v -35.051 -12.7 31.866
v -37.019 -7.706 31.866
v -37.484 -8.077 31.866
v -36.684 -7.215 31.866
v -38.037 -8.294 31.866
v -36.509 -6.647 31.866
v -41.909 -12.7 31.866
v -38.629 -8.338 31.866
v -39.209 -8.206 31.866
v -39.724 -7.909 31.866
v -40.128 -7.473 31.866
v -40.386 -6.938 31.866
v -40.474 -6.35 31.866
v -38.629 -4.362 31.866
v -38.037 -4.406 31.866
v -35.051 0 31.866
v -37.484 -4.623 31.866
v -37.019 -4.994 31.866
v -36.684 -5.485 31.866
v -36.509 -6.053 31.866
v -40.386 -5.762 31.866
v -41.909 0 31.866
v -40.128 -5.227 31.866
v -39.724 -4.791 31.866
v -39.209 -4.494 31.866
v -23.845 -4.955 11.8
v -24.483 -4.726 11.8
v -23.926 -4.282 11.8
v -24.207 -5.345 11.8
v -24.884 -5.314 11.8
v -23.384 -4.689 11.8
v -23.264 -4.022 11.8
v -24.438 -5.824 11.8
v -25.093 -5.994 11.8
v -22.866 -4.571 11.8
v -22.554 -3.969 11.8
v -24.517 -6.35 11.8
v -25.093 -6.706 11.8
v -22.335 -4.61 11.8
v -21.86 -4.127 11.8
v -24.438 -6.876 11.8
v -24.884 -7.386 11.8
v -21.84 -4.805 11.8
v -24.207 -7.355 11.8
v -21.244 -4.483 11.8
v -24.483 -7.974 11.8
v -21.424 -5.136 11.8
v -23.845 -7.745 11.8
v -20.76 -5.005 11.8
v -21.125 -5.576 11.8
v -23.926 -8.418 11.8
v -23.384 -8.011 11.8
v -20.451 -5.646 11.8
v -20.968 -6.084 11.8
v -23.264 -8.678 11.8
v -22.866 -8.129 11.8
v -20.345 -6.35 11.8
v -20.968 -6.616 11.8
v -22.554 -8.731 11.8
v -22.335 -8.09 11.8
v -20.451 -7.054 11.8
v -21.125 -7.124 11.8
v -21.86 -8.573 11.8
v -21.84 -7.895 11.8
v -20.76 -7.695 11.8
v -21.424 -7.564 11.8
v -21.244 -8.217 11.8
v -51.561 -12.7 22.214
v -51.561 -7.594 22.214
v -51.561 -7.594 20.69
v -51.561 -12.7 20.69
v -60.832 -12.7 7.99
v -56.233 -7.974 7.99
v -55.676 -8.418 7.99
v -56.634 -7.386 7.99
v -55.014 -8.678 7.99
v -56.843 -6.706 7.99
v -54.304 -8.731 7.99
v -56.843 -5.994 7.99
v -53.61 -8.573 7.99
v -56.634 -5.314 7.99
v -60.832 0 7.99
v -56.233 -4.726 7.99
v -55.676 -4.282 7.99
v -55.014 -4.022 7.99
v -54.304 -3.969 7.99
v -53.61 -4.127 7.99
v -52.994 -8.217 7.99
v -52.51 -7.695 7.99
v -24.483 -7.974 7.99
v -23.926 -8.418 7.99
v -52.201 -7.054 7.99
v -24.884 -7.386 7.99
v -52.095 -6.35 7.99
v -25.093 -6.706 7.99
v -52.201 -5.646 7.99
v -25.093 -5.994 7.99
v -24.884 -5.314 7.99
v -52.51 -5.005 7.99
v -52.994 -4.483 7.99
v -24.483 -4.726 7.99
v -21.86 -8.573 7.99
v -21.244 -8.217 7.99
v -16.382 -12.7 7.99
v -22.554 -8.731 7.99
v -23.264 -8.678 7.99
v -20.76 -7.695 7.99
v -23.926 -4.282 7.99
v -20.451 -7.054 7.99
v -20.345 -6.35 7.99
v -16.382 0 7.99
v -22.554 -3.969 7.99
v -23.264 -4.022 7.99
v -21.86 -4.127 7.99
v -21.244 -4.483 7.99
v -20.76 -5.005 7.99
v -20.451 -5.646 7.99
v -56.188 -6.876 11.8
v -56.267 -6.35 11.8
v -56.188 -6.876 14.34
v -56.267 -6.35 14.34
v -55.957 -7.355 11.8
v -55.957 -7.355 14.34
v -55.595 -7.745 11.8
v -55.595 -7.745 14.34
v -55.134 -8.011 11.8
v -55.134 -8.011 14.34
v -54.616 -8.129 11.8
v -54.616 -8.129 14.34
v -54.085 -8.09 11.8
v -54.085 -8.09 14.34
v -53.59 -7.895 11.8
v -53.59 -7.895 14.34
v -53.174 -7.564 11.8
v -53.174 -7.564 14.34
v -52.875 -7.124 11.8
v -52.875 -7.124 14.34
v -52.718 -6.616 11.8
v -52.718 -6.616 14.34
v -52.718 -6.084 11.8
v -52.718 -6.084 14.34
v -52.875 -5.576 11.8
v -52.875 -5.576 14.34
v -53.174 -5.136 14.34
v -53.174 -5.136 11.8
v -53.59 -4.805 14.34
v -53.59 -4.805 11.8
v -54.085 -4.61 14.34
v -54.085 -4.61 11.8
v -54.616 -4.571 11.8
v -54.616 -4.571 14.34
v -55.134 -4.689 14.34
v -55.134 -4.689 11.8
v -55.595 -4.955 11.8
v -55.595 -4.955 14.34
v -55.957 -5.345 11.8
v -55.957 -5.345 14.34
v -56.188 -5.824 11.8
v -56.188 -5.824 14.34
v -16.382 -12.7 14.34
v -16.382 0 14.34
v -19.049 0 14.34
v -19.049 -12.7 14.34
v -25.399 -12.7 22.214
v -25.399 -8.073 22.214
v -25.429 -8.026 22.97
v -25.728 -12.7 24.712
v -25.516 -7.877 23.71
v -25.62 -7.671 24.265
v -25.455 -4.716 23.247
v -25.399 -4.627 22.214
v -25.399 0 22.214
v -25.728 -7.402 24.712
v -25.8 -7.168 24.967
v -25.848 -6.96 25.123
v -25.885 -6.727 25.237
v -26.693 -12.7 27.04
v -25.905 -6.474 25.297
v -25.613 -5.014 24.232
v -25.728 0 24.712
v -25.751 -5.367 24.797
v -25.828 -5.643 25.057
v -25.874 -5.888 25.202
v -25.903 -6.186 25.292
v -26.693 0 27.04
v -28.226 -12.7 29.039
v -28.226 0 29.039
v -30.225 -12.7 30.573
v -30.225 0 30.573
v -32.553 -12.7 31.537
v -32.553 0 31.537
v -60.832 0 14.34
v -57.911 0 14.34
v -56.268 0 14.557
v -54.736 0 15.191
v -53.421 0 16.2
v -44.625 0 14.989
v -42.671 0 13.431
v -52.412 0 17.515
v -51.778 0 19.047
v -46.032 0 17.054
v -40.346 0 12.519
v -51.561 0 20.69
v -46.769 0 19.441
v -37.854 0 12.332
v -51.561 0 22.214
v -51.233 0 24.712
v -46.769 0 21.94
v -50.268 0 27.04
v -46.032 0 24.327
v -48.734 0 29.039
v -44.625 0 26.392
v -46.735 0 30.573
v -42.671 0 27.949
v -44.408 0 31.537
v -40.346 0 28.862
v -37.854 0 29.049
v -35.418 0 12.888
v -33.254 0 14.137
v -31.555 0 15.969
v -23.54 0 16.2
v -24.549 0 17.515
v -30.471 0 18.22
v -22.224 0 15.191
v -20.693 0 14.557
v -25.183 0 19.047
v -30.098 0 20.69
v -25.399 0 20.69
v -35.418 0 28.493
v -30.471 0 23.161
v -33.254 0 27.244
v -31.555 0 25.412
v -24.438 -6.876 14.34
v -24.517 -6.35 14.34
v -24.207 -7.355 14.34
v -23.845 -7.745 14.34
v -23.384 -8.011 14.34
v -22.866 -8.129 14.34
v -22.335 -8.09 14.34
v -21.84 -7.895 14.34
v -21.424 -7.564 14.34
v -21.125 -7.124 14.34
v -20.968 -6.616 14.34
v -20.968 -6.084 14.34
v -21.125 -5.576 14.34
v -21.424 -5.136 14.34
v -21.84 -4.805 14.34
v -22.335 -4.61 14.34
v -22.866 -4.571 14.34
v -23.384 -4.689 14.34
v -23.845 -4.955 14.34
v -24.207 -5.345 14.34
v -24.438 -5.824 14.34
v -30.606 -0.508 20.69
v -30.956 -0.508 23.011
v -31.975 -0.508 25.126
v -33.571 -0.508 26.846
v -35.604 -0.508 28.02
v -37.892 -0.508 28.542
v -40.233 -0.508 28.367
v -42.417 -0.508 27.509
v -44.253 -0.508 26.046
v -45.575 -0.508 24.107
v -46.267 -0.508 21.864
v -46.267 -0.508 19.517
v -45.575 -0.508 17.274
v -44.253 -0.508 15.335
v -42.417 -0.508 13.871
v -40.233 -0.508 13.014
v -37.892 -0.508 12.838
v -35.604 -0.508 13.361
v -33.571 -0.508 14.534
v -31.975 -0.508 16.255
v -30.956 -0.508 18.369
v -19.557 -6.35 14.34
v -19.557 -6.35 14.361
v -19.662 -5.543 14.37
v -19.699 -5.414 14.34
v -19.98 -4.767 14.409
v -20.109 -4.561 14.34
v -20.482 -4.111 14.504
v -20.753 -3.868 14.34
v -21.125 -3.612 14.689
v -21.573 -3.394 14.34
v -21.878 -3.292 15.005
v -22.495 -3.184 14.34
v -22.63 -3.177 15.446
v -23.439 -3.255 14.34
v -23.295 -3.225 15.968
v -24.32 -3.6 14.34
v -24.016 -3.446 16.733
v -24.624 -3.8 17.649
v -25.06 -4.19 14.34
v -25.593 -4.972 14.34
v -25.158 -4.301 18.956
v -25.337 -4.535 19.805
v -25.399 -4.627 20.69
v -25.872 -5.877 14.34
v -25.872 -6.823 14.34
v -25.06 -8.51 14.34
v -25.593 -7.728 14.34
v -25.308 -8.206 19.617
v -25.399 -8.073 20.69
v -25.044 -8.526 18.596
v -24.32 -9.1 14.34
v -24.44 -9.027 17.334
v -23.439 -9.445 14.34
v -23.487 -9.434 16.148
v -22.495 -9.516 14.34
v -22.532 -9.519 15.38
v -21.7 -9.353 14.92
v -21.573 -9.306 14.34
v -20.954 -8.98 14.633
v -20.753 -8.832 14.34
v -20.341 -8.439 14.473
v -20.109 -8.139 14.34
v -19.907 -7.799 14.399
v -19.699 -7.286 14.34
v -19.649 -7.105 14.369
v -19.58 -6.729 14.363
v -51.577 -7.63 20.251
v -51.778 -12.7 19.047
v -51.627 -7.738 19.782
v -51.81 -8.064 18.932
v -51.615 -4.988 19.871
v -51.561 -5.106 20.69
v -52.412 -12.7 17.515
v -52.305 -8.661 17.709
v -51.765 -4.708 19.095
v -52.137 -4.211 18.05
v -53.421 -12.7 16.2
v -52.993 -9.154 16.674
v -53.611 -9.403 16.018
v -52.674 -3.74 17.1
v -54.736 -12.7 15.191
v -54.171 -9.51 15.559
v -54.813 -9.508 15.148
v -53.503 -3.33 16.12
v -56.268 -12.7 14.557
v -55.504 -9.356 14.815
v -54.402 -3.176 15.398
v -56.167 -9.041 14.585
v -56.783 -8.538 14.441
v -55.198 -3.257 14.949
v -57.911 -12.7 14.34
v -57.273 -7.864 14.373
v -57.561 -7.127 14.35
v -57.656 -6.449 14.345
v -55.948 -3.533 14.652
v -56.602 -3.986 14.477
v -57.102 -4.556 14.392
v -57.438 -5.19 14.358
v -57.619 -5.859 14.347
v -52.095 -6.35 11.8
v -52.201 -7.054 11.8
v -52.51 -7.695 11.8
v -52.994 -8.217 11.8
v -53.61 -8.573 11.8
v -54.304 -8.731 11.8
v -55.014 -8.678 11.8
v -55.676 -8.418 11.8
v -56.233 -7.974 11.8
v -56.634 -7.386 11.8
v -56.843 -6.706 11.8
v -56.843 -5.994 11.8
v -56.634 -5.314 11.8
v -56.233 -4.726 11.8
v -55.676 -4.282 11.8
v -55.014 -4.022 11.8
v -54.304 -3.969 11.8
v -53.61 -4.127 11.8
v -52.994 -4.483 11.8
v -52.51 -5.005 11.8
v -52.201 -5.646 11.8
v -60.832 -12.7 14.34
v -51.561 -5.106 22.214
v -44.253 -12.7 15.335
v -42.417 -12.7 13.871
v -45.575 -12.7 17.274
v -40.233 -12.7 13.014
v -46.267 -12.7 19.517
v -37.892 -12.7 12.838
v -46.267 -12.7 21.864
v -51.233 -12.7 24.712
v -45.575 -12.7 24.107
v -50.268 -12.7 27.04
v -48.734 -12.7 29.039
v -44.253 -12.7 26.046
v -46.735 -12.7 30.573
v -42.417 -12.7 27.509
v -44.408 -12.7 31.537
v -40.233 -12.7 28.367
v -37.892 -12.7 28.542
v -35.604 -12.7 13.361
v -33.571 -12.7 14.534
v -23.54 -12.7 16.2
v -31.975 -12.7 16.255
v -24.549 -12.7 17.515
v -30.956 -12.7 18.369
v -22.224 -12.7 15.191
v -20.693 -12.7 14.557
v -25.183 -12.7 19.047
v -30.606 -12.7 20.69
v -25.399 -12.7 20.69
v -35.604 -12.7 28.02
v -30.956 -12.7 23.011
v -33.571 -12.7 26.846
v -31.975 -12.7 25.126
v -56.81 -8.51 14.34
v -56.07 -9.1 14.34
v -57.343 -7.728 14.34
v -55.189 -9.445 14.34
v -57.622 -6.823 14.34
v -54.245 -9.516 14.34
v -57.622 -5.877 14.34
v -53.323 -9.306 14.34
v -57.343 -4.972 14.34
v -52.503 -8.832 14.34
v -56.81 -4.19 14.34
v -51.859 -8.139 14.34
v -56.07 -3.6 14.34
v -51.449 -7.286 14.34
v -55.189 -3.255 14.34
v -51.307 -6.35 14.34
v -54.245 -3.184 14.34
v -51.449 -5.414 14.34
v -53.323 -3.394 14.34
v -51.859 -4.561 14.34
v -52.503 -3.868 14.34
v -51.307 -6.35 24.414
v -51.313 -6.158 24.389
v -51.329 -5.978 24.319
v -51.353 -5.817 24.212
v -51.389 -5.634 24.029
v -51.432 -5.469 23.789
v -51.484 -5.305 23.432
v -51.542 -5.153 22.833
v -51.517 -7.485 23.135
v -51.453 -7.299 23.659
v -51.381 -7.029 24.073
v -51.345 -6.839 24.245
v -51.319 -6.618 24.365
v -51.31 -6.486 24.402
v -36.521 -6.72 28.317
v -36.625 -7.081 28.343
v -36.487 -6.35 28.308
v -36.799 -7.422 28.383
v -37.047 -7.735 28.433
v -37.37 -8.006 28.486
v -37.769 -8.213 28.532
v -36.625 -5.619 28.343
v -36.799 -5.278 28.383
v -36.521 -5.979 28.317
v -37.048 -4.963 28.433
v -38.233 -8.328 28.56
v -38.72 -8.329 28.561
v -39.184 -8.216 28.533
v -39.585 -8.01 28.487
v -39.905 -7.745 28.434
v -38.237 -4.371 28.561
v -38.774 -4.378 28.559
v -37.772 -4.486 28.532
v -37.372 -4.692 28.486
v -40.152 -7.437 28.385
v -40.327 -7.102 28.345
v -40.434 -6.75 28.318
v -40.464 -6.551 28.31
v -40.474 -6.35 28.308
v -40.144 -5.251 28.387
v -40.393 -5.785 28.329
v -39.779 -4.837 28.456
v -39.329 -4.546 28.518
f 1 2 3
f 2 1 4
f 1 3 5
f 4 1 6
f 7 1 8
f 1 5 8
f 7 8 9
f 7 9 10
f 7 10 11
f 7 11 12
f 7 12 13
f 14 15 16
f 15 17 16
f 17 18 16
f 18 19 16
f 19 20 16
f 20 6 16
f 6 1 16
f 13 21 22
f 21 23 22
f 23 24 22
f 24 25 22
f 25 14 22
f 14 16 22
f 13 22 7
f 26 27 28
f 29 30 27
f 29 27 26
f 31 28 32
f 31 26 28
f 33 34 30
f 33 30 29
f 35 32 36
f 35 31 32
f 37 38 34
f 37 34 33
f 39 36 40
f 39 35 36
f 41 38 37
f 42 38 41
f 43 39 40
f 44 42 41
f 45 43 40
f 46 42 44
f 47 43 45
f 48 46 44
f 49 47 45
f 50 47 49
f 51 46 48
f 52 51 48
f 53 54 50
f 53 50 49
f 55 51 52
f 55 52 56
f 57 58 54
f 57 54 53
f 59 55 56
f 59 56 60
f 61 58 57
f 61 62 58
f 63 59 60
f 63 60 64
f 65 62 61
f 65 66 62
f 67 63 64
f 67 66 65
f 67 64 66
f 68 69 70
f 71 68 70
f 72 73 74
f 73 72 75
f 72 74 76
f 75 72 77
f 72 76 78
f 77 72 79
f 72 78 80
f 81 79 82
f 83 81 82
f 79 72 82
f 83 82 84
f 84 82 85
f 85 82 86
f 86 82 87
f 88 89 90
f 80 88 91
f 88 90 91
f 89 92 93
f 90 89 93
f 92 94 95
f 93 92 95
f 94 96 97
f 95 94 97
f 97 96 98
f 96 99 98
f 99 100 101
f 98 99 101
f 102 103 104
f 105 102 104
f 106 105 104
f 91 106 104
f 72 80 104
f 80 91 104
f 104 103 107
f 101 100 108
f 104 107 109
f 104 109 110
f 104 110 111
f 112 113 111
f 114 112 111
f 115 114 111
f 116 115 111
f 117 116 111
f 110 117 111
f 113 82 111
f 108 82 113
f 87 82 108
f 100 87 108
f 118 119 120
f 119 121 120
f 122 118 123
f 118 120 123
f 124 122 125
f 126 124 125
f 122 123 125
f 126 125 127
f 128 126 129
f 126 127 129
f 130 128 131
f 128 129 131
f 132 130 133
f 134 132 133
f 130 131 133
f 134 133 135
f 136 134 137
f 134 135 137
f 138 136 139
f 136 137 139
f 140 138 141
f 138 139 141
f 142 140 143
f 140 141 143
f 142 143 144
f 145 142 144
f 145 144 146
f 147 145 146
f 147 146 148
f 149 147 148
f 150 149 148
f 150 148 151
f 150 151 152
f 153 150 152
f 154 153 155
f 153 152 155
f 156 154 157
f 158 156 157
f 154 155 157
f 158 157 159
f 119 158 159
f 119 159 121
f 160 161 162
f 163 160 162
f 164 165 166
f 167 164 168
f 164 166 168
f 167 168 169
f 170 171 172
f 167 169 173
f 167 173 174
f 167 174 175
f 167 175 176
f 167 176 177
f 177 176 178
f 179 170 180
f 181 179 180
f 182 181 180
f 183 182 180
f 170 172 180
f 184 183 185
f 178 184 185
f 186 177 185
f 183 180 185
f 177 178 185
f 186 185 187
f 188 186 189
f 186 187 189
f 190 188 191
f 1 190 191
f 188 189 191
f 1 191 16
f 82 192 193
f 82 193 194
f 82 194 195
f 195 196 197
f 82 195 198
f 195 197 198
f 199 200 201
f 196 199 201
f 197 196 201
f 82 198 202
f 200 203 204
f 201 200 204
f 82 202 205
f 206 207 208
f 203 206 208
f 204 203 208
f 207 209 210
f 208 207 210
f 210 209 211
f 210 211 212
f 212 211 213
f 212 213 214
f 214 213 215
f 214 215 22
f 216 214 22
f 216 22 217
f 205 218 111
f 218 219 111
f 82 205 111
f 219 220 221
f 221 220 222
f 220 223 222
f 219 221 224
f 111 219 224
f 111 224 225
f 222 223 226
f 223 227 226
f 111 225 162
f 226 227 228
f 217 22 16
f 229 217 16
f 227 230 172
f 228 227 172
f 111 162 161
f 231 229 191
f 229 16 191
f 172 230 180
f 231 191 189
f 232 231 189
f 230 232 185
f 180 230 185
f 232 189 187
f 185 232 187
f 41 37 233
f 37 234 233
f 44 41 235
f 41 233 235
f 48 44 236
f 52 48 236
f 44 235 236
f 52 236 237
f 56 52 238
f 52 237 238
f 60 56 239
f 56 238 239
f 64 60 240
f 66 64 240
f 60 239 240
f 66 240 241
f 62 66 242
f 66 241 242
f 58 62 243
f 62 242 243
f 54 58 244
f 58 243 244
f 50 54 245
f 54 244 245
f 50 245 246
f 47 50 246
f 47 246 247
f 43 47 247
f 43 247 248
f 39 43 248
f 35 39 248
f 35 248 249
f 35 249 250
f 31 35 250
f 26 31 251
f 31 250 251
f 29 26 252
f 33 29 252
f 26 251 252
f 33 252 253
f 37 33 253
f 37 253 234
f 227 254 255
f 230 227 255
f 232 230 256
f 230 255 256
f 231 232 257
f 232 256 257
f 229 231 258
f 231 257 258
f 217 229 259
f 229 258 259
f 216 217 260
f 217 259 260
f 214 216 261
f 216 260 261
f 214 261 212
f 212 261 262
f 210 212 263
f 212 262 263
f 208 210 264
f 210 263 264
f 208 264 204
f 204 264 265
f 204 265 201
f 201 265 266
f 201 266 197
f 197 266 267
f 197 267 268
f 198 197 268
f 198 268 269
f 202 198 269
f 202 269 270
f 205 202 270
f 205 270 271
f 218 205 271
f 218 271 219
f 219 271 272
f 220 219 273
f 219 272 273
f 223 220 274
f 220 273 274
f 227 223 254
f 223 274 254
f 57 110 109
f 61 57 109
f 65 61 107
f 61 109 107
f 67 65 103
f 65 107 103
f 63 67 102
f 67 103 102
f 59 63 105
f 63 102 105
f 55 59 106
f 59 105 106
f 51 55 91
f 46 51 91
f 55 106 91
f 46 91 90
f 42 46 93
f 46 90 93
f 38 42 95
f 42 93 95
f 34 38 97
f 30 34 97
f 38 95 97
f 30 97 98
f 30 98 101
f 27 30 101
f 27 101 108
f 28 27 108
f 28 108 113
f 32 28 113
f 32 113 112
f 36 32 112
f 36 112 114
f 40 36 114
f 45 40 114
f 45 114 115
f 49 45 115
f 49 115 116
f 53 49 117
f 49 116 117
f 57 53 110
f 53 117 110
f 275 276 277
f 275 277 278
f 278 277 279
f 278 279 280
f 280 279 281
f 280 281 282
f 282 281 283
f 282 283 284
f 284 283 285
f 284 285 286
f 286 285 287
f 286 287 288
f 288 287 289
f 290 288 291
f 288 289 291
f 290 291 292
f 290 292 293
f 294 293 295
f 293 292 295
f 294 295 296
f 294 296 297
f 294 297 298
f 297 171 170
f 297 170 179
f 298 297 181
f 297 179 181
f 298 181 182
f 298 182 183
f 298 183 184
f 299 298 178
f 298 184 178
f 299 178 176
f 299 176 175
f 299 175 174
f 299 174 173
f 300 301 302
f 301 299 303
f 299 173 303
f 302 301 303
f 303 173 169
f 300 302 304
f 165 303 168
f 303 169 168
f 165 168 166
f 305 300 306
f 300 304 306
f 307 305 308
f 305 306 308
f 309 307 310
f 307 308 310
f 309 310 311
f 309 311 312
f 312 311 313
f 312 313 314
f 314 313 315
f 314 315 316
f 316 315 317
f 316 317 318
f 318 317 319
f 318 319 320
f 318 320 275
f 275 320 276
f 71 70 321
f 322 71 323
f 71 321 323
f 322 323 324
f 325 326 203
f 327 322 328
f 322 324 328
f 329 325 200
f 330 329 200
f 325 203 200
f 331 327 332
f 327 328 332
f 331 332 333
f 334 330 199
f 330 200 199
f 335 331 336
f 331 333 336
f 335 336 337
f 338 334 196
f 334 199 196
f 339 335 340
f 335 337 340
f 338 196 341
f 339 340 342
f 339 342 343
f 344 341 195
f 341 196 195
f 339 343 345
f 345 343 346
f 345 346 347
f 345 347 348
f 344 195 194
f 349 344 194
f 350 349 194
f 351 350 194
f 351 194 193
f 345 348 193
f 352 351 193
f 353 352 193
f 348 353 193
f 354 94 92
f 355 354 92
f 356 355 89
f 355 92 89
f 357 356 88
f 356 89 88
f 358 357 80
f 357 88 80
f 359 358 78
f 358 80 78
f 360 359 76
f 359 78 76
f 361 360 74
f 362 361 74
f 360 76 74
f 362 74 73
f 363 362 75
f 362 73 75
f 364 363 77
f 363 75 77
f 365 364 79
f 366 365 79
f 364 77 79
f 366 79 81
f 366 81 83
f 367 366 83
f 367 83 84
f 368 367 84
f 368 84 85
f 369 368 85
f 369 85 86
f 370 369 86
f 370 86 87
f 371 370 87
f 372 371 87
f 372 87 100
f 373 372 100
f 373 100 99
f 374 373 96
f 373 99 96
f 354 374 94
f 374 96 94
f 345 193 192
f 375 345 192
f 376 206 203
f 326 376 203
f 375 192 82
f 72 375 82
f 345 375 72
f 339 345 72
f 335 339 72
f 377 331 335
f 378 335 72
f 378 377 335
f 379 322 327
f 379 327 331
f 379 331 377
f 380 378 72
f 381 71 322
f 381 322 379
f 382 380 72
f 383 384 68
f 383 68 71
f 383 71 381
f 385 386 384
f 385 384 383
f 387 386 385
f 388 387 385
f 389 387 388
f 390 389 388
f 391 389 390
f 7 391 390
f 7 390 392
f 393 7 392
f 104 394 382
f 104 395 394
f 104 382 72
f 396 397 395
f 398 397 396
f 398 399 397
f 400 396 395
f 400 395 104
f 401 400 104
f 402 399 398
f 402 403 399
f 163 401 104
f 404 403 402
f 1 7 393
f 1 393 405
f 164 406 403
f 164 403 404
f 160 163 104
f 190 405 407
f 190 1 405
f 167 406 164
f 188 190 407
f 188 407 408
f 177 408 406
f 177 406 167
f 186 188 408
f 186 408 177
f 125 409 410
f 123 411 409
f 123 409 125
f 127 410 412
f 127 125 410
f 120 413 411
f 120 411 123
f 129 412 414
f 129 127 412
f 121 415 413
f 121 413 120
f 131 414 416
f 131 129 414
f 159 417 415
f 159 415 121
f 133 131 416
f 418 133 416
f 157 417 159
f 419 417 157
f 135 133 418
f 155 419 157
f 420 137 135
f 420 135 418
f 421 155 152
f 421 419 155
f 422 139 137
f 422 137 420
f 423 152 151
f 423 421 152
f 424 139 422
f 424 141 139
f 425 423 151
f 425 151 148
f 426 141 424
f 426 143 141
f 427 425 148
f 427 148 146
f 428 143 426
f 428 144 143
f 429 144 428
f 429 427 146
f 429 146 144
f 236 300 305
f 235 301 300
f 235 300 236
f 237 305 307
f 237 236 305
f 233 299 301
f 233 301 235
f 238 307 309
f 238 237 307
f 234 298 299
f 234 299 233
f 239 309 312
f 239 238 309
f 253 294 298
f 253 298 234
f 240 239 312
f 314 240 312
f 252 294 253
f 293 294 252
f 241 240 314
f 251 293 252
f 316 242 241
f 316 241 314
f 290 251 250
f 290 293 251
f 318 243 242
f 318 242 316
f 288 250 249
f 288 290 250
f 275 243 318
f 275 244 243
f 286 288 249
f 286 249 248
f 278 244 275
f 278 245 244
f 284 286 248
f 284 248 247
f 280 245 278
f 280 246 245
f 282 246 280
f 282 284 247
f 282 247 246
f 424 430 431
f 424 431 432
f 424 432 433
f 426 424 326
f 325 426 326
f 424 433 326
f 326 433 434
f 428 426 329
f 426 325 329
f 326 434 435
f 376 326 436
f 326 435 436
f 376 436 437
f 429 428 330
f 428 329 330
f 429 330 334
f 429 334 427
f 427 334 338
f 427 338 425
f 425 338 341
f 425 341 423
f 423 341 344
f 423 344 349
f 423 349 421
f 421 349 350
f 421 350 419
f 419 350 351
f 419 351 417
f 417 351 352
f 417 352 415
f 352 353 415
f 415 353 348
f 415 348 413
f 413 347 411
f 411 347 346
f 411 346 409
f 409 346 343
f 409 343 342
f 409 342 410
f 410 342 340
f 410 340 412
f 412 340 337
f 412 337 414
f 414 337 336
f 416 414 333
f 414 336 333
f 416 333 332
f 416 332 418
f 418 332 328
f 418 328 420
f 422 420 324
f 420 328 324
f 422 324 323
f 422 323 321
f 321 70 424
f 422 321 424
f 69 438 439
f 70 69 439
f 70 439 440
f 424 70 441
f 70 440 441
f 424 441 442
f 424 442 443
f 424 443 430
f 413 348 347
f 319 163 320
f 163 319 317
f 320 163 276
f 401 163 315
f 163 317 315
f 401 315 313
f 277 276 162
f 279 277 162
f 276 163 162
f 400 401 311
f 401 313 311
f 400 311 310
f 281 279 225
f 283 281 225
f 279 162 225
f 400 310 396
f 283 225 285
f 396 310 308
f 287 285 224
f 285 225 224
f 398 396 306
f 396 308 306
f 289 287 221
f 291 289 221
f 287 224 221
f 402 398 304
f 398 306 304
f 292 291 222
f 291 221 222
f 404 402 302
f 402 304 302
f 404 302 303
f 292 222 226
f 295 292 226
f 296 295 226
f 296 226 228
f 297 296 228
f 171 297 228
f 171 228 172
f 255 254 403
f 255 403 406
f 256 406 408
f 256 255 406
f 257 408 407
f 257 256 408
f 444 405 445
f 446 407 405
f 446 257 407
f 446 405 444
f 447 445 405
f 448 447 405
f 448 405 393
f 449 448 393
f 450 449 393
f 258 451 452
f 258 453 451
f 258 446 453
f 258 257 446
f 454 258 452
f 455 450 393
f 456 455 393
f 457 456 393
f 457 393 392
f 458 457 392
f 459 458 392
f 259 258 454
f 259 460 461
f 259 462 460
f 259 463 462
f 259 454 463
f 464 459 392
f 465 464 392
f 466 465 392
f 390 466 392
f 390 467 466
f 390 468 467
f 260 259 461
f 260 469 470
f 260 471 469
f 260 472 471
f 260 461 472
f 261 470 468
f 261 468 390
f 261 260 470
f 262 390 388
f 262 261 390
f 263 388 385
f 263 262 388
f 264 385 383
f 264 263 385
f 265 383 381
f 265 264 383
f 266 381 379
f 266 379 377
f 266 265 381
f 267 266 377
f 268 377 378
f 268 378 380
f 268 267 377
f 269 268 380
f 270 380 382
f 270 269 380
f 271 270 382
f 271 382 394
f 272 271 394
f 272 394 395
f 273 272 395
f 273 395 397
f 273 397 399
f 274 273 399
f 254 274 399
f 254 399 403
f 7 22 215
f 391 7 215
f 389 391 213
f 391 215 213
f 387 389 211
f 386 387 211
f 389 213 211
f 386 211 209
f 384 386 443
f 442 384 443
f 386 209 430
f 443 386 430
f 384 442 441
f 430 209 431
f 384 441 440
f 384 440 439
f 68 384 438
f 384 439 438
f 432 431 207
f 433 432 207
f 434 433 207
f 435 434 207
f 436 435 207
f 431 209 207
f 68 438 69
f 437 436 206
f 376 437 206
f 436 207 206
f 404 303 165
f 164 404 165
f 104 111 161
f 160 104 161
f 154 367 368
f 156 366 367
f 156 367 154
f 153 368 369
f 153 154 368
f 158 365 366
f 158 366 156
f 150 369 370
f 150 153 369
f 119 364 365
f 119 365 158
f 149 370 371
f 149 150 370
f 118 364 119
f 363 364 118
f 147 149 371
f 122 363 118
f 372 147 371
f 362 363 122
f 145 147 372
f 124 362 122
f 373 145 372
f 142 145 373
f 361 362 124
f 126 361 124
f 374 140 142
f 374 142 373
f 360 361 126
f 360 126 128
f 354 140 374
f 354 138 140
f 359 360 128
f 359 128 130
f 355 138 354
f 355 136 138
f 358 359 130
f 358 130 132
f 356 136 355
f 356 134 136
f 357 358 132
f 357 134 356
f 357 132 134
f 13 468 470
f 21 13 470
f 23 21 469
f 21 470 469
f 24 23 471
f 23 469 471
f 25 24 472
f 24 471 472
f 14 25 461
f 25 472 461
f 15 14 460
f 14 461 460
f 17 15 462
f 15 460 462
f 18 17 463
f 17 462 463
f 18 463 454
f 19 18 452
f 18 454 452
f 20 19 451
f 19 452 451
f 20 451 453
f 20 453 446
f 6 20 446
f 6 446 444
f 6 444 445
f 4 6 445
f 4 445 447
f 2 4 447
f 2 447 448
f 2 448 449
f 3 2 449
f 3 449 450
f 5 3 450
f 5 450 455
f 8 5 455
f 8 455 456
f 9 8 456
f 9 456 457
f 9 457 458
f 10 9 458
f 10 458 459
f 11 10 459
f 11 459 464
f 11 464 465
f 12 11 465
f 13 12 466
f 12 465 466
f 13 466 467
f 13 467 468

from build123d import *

# Parameters (mm, degrees)
F0_R      = 7.874
F1_DEPTH  = 12.7
F3_D      = 3.5687
F2_R      = 2.3876
F4_DEPTH  = 3.81
F6_R      = 3.175
F7_DEPTH  = 12.7
F9_D      = 3.9878
F9_DEPTH  = 6.35
F9_TIP    = 1.1980559883
F10_SIZE2 = 0.508
F10_SIZE  = 0.508


with BuildPart() as f1:
    # F0 (on Front) → F1 (new body)
    with BuildSketch(Plane.XZ):
        with BuildLine():
            Line((-60.8324925442, 14.3403462902), (-60.8324925442, 7.9903462902))
            Line((-60.8324925442, 7.9903462902), (-16.3824925442, 7.9903462902))
            Line((-16.3824925442, 7.9903462902), (-16.3824925442, 14.3403462902))
            Line((-16.3824925442, 14.3403462902), (-19.0494925442, 14.3403462902))
            ThreePointArc((-19.0494925442, 14.3403462902), (-23.5396206047, 16.2002182296), (-25.3994925442, 20.6903462902))
            Line((-25.3994925442, 20.6903462902), (-25.3994925442, 22.2143462902))
            ThreePointArc((-25.3994925442, 22.2143462902), (-28.2264978922, 29.0393409422), (-35.0514925442, 31.8663462902))
            Line((-35.0514925442, 31.8663462902), (-41.9094925442, 31.8663462902))
            ThreePointArc((-41.9094925442, 31.8663462902), (-48.7344871962, 29.0393409422), (-51.5614925442, 22.2143462902))
            Line((-51.5614925442, 22.2143462902), (-51.5614925442, 20.6903462902))
            ThreePointArc((-51.5614925442, 20.6903462902), (-53.4213644836, 16.2002182296), (-57.9114925442, 14.3403462902))
            Line((-57.9114925442, 14.3403462902), (-60.8324925442, 14.3403462902))
        make_face()
        with Locations((-38.4804925442, 20.6903462902)):
            Circle(F0_R, mode=Mode.SUBTRACT)
    extrude(amount=F1_DEPTH)

    # F3 (through all)
    with Locations(Plane(origin=(0, 0, 7.9903462902), x_dir=(1, 0, 0), z_dir=(0, 0, -1))):
        with Locations((-54.4824925442, 6.35), (-22.7324925442, 6.35)):
            Hole(F3_D / 2)

    # F2 (on face) → F4 (cut)
    with BuildSketch(Plane(origin=(0, 0, 7.9903462902), x_dir=(1, 0, 0), z_dir=(0, 0, -1))):
        with Locations((-54.4824925442, 6.35)):
            Circle(F2_R)
        with Locations((-22.7324925442, 6.35)):
            Circle(F2_R)
    extrude(amount=-F4_DEPTH, mode=Mode.SUBTRACT)

    # F6 (on offset) → F7 (cut)
    with BuildSketch(Plane.XY.offset(27.0403462902)):
        with Locations((-54.4824925442, -6.35)):
            Circle(F6_R)
        with Locations((-22.7324925442, -6.35)):
            Circle(F6_R)
    extrude(amount=-F7_DEPTH, mode=Mode.SUBTRACT)

    # F9
    with Locations(Plane.XY.offset(31.8663462902)):
        with Locations((-38.4804925442, -6.35)):
            Hole(F9_D / 2, depth=F9_DEPTH)
            with Locations((0, 0, -(F9_DEPTH + F9_TIP / 2))):  # 118° drill point
                Cone(0, F9_D / 2, F9_TIP, mode=Mode.SUBTRACT)

    # F10
    f10_edges = [f1.edges().sort_by_distance(p)[0] for p in [
        (-46.354493, 0, 20.690346),
    ]]
    chamfer(f10_edges, length=F10_SIZE, length2=F10_SIZE2)


solid = f1.part
